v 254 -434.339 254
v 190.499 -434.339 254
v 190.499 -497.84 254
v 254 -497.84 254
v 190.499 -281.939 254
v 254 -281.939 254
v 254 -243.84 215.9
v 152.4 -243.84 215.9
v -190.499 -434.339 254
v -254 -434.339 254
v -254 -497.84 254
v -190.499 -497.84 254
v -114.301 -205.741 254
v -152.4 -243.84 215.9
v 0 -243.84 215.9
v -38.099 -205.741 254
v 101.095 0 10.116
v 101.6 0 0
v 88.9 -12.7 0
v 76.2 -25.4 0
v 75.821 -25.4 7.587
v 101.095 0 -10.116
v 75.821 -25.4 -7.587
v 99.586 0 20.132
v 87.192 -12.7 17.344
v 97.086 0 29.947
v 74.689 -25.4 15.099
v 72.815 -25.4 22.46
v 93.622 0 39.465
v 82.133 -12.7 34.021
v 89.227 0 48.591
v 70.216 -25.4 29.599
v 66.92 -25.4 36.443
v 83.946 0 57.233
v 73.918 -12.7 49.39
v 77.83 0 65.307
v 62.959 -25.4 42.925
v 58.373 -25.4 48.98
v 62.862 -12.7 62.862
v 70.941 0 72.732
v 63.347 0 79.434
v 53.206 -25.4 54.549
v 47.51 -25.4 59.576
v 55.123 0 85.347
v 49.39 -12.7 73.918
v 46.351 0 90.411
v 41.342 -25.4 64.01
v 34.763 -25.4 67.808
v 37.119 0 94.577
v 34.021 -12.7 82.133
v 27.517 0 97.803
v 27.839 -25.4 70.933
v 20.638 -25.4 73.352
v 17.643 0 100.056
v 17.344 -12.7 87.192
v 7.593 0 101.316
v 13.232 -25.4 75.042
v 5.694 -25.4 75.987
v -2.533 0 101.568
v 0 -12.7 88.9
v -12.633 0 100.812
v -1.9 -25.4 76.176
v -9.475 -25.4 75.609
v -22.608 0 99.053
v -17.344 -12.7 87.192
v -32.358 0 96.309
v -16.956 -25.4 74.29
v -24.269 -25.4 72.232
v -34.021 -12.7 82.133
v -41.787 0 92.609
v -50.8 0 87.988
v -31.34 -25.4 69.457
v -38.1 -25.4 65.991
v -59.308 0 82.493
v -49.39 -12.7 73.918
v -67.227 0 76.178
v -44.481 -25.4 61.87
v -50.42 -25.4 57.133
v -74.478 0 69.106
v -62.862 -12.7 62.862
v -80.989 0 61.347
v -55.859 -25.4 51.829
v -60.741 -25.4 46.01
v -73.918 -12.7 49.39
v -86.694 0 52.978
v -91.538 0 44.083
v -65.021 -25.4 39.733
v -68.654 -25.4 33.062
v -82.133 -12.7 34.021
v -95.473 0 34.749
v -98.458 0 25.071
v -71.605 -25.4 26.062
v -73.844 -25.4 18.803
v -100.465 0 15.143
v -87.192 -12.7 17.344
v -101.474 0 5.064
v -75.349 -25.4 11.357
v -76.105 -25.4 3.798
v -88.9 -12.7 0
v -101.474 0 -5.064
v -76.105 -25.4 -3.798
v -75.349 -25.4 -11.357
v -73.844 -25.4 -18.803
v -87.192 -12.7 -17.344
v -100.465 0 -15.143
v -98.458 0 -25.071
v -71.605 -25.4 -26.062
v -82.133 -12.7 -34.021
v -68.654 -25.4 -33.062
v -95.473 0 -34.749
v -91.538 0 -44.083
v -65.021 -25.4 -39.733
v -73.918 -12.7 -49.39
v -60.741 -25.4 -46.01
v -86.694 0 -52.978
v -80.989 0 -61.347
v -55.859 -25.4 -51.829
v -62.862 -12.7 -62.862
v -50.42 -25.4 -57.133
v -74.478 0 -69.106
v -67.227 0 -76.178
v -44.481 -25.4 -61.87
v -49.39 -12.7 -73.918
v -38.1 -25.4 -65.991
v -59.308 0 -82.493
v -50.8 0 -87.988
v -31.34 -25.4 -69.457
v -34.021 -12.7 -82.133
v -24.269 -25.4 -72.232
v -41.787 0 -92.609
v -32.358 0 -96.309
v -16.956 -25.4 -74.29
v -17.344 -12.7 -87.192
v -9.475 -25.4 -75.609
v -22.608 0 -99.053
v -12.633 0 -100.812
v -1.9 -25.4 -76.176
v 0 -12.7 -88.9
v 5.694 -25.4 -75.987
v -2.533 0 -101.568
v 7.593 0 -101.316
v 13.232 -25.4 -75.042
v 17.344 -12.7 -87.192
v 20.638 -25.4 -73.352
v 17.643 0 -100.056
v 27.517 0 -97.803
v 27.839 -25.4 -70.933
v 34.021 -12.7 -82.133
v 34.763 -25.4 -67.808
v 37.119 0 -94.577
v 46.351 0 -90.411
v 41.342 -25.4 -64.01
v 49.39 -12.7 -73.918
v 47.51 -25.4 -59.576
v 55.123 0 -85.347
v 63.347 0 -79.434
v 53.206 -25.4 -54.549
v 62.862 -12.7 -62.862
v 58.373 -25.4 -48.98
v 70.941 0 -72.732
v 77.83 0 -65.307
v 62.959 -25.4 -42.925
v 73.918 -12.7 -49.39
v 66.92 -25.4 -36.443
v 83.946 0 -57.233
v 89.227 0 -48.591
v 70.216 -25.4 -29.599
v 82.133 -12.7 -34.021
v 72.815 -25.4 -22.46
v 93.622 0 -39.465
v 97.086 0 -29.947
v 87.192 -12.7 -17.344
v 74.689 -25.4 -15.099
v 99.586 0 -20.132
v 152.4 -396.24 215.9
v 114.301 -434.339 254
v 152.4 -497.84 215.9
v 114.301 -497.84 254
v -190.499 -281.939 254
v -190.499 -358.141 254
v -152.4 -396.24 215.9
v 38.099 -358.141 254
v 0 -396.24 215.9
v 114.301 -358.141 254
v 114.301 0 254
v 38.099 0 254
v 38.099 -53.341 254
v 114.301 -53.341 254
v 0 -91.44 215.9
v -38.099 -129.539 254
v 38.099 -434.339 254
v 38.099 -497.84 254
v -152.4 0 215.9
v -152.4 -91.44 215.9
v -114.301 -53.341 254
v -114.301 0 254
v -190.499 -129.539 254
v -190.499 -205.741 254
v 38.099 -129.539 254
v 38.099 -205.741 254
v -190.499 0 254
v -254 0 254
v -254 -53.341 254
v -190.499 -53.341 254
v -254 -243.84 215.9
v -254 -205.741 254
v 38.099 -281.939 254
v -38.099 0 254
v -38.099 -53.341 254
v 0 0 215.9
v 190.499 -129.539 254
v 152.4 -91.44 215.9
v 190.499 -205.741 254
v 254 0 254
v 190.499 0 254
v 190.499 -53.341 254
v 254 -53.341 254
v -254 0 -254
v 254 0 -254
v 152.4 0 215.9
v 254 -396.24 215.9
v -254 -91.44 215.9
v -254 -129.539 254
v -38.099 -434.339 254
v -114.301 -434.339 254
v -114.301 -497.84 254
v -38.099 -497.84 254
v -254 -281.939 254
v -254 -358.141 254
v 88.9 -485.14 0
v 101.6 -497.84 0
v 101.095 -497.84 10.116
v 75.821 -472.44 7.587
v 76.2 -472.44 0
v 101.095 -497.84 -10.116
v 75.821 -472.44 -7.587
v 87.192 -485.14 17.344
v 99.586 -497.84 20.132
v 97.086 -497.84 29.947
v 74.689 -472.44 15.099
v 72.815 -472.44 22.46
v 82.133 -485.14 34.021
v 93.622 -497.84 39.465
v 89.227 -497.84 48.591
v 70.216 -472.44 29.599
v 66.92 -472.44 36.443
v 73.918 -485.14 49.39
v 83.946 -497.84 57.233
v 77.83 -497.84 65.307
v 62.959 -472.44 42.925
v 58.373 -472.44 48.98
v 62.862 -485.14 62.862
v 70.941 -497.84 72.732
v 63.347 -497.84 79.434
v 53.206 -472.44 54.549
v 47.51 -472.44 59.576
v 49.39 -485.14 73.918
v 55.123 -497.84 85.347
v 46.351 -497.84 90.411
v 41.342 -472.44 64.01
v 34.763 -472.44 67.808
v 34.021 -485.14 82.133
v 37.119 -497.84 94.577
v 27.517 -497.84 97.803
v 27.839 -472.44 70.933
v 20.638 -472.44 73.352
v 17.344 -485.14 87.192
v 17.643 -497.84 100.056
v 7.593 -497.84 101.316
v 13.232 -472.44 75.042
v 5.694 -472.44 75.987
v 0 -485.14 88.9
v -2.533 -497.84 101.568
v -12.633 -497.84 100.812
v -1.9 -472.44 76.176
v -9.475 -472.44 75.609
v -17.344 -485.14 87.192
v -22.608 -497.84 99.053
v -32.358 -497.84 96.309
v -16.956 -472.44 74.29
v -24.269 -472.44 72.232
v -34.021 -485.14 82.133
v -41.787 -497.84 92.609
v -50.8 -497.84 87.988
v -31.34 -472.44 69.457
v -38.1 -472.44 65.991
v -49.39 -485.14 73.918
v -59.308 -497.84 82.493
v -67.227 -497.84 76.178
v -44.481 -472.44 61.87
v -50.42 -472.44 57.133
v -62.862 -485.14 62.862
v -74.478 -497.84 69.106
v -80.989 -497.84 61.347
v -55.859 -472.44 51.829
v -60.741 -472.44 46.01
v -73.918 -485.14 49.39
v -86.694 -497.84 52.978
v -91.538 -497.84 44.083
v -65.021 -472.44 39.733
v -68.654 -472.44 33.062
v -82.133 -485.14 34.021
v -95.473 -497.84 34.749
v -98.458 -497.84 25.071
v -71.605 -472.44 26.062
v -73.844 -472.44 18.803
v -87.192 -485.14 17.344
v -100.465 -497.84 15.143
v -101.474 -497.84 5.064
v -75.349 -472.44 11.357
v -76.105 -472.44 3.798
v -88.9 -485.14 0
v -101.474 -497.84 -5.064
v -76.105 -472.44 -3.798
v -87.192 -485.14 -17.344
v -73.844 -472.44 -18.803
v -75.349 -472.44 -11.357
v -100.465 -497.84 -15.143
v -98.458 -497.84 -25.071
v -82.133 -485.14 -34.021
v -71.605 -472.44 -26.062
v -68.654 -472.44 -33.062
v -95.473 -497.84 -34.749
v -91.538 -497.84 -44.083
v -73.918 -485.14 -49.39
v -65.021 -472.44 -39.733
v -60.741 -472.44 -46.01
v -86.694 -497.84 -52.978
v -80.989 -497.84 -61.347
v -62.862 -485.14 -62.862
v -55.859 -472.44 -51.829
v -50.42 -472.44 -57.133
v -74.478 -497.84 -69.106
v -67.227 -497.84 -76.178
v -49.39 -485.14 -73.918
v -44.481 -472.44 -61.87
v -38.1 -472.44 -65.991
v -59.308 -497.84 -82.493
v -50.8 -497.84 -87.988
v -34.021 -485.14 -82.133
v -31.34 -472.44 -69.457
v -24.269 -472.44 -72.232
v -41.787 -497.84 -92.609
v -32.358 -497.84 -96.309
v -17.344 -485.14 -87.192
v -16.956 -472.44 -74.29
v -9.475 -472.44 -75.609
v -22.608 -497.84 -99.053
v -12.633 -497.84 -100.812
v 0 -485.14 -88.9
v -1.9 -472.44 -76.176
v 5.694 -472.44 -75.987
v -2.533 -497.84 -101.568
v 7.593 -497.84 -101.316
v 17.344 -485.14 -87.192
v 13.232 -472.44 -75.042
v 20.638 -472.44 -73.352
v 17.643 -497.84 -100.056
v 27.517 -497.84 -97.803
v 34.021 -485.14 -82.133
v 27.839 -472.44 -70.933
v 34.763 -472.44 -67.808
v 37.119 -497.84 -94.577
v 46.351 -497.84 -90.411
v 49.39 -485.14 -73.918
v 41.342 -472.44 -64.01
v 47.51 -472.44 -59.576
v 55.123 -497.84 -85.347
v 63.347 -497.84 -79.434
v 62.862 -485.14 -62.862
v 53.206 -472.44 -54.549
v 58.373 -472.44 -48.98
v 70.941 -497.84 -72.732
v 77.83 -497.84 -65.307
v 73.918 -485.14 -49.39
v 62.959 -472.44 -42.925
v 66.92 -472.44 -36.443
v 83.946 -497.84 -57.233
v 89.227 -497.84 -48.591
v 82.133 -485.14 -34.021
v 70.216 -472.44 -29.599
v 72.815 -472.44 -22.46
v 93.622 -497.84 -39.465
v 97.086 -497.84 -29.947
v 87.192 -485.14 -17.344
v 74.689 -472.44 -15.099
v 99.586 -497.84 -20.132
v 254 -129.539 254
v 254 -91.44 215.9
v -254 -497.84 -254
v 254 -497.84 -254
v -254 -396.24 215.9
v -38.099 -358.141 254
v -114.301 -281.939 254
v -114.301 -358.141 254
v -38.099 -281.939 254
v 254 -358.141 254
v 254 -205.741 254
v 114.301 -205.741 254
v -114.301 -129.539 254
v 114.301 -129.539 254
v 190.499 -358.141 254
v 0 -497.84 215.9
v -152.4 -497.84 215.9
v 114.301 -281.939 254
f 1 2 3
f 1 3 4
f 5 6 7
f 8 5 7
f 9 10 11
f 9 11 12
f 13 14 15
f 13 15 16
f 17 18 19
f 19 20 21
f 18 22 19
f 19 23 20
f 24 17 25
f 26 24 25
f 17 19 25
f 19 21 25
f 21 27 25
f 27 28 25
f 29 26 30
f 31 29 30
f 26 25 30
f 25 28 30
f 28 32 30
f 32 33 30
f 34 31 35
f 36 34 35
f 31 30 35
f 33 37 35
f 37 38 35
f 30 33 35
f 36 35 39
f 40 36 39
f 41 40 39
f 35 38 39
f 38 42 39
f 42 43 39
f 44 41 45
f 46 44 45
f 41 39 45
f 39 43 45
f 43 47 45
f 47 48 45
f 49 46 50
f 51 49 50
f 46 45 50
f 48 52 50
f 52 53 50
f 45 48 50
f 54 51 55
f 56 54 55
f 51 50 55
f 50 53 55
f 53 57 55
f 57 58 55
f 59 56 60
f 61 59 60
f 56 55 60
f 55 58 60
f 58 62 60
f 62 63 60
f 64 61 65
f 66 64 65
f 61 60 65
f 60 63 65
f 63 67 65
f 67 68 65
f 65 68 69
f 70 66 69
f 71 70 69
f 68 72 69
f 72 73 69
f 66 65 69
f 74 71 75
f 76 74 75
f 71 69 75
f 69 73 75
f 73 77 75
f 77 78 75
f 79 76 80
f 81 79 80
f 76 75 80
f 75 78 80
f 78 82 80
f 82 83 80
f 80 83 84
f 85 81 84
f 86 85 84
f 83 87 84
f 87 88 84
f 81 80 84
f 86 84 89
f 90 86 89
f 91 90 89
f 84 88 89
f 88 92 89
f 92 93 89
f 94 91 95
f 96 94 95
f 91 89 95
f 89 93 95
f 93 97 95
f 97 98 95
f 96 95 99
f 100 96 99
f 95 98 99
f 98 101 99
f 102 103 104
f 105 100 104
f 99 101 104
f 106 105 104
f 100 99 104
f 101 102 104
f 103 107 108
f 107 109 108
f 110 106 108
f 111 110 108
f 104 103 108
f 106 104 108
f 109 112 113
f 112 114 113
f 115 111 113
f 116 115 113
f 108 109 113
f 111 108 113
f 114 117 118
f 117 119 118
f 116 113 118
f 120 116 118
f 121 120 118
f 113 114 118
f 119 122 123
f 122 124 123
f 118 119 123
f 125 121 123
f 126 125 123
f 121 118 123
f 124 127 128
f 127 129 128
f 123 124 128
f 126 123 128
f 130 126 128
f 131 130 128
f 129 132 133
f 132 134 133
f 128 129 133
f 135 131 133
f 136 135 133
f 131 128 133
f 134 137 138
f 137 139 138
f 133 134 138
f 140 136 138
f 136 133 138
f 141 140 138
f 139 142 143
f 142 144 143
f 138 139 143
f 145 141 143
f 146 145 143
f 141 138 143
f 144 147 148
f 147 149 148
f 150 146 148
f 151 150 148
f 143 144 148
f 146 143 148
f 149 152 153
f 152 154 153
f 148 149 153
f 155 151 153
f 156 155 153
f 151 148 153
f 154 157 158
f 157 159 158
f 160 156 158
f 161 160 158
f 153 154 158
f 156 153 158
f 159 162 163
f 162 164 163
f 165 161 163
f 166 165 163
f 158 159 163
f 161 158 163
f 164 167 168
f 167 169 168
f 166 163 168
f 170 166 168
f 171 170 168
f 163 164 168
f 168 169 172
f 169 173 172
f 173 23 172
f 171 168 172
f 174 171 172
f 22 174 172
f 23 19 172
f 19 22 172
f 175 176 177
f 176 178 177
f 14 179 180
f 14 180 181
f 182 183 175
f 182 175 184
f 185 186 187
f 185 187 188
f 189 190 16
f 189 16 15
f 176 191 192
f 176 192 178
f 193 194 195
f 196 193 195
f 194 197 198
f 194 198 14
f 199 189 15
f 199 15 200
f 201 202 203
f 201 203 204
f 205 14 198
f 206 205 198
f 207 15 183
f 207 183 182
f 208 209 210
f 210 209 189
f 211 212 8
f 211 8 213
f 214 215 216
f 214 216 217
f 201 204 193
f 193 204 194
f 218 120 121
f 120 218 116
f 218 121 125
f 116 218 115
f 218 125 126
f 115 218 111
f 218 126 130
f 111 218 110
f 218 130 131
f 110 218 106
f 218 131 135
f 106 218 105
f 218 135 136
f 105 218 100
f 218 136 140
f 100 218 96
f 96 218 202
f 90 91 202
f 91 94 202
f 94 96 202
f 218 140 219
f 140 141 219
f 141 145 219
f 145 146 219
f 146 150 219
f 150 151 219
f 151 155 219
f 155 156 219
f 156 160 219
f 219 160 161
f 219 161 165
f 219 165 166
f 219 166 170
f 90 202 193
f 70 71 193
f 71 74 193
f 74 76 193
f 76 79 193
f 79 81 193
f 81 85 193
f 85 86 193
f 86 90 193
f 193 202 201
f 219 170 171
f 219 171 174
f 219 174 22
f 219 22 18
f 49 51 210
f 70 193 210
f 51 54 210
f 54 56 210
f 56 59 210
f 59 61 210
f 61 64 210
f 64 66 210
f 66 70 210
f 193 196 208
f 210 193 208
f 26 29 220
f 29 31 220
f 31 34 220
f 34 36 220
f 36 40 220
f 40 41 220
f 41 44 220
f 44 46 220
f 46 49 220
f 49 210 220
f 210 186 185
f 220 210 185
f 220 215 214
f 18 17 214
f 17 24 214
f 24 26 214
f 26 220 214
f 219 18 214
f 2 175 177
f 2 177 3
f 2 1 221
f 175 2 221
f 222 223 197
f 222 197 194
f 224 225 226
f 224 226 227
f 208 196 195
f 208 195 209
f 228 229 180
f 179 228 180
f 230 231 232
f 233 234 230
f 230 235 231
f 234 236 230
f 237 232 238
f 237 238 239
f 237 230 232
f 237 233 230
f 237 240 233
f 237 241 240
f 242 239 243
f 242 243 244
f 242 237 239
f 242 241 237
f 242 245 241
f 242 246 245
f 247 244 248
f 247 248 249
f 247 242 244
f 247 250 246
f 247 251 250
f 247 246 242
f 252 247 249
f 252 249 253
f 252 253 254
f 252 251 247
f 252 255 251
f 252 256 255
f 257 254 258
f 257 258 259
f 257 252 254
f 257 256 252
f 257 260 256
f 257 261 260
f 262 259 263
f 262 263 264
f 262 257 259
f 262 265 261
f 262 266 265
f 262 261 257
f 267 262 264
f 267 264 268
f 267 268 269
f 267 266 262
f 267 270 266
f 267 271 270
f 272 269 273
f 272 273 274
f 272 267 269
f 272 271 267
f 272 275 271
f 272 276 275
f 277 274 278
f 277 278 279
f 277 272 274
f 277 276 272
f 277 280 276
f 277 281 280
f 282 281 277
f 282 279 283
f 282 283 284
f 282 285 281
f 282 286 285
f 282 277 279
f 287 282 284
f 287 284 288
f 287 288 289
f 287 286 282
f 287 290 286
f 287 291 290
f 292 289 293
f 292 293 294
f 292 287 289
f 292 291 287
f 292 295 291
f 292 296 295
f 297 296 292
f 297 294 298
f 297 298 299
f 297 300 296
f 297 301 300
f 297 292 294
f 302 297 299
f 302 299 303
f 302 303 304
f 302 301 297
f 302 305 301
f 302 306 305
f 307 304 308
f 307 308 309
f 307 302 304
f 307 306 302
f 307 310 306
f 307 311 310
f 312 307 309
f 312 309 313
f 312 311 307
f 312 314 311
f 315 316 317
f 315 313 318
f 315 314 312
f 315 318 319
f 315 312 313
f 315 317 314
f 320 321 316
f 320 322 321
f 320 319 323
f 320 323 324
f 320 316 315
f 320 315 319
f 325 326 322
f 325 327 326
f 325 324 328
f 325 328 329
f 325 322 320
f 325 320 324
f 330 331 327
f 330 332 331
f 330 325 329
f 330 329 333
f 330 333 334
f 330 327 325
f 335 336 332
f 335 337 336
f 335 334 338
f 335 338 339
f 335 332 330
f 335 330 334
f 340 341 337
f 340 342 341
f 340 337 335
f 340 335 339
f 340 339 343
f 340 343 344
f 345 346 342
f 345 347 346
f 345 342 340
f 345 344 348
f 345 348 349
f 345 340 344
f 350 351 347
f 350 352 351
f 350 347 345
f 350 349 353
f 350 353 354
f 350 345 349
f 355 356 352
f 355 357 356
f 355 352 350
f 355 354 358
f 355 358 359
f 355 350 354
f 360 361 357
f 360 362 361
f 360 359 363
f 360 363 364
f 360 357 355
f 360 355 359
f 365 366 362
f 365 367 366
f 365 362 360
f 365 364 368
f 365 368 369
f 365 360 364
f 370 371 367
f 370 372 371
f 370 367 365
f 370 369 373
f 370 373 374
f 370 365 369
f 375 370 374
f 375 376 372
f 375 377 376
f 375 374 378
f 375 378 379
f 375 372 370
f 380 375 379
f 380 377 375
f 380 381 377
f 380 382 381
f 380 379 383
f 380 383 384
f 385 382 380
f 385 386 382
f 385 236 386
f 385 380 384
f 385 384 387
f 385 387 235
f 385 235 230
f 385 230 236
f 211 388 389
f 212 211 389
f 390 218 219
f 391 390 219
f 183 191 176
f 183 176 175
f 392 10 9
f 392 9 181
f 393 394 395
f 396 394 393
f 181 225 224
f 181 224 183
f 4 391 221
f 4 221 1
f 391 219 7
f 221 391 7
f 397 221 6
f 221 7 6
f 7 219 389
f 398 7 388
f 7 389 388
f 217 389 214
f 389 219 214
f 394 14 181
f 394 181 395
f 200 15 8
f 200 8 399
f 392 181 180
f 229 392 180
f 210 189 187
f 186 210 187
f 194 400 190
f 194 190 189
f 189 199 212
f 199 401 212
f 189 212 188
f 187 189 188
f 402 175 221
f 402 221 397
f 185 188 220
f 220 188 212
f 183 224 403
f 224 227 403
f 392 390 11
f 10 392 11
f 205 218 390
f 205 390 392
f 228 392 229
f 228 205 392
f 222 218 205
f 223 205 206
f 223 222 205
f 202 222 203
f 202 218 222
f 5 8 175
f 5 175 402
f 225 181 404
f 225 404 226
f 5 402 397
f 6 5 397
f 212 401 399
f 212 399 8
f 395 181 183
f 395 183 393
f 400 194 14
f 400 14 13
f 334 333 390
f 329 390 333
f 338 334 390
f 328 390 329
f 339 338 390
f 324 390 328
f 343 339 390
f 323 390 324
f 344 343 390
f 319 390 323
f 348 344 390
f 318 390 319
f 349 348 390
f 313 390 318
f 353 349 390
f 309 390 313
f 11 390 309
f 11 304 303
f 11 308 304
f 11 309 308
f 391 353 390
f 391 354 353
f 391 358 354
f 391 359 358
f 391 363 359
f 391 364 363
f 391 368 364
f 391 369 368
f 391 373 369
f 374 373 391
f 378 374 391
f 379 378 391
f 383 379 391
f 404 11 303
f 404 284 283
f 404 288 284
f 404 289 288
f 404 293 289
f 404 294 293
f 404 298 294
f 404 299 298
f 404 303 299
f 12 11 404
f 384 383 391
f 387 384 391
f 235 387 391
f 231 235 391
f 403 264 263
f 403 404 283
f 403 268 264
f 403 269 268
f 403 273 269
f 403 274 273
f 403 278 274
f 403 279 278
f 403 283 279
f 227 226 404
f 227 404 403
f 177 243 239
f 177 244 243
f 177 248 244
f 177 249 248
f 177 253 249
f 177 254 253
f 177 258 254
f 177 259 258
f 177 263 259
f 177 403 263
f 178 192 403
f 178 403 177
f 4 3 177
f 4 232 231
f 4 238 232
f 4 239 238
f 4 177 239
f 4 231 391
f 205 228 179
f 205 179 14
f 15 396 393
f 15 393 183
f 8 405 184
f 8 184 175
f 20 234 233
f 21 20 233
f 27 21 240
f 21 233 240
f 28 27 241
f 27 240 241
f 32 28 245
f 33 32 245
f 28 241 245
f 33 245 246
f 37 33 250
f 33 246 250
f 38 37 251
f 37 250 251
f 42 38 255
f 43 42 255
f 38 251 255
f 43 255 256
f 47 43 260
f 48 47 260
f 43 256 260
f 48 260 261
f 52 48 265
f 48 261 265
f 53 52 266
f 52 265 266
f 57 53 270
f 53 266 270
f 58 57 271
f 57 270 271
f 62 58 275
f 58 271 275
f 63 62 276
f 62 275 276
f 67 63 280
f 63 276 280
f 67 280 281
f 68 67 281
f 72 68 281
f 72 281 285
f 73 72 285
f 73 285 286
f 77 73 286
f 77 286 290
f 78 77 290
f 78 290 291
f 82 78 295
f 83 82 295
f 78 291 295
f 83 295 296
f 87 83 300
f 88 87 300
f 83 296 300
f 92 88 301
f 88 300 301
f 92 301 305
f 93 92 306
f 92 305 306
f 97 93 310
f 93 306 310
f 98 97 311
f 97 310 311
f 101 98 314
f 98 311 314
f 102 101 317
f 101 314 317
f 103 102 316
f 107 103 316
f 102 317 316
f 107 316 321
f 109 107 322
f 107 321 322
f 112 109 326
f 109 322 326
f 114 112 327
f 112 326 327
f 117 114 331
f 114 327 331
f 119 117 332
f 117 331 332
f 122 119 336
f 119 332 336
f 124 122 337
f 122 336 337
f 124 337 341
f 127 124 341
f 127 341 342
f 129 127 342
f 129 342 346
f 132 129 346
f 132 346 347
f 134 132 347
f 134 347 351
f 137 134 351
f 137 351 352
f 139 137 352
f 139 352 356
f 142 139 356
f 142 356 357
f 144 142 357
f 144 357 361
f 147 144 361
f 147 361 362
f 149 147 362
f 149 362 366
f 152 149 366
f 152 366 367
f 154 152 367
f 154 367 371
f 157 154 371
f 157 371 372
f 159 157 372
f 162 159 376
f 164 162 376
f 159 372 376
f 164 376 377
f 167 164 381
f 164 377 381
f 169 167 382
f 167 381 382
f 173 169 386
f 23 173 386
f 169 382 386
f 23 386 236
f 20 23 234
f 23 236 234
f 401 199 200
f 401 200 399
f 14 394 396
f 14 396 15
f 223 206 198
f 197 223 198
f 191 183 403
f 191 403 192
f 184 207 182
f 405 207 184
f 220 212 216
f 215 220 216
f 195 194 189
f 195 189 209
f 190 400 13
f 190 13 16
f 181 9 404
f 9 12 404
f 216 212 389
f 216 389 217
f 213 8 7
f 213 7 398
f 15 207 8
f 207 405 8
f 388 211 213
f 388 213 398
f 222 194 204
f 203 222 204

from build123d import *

# Parameters (mm, degrees)
F0_W      = 508
F0_H      = 508
F1_DEPTH  = 497.84
F2_R      = 76.2
F3_DEPTH  = 678.243577
F4_SIZE   = 25.4
F6_DEPTH  = 635
F8_DEPTH  = 635
F10_DEPTH = 635
F12_DEPTH = 635
F14_DEPTH = 635
F16_DEPTH = 635


with BuildPart() as f1:
    # F0 (on Front) → F1 (new body)
    with BuildSketch(Plane.XZ):
        Rectangle(F0_W, F0_H)
    extrude(amount=F1_DEPTH)

    # F2 (on face) → F3 (cut, symmetric)
    with BuildSketch(Plane.XZ.offset(497.84)):
        Circle(F2_R)
    extrude(amount=F3_DEPTH, both=True, mode=Mode.SUBTRACT)

    # F4
    f4_edges = [f1.edges().sort_by_distance(p)[0] for p in [
        (-76.2, -497.84, 0),
        (-76.2, 0, 0),
    ]]
    chamfer(f4_edges, length=F4_SIZE)

    # F5 (on Front) → F6 (cut, symmetric)
    with BuildSketch(Plane.XZ):
        Polygon((-206.28102, 269.782053), (-152.4, 215.9), (-98.51898, 269.782053), align=None)
    extrude(amount=F6_DEPTH, both=True, mode=Mode.SUBTRACT)

    # F7 (on Front) → F8 (cut, symmetric)
    with BuildSketch(Plane.XZ):
        Polygon((-53.88102, 269.782053), (0, 215.9), (53.88102, 269.782053), align=None)
    extrude(amount=F8_DEPTH, both=True, mode=Mode.SUBTRACT)

    # F9 (on Front) → F10 (cut, symmetric)
    with BuildSketch(Plane.XZ):
        Polygon((98.51898, 269.782053), (152.4, 215.9), (206.28102, 269.782053), align=None)
    extrude(amount=F10_DEPTH, both=True, mode=Mode.SUBTRACT)

    # F11 (on Right) → F12 (cut, symmetric)
    with BuildSketch(Plane.YZ):
        Polygon((-145.32102, 269.782053), (-91.44, 215.9), (-37.55898, 269.782053), align=None)
    extrude(amount=F12_DEPTH, both=True, mode=Mode.SUBTRACT)

    # F13 (on Right) → F14 (cut, symmetric)
    with BuildSketch(Plane.YZ):
        Polygon((-297.72102, 269.782053), (-243.84, 215.9), (-189.95898, 269.782053), align=None)
    extrude(amount=F14_DEPTH, both=True, mode=Mode.SUBTRACT)

    # F15 (on Right) → F16 (cut, symmetric)
    with BuildSketch(Plane.YZ):
        Polygon((-450.12102, 269.782053), (-396.24, 215.9), (-342.35898, 269.782053), align=None)
    extrude(amount=F16_DEPTH, both=True, mode=Mode.SUBTRACT)


solid = f1.part
